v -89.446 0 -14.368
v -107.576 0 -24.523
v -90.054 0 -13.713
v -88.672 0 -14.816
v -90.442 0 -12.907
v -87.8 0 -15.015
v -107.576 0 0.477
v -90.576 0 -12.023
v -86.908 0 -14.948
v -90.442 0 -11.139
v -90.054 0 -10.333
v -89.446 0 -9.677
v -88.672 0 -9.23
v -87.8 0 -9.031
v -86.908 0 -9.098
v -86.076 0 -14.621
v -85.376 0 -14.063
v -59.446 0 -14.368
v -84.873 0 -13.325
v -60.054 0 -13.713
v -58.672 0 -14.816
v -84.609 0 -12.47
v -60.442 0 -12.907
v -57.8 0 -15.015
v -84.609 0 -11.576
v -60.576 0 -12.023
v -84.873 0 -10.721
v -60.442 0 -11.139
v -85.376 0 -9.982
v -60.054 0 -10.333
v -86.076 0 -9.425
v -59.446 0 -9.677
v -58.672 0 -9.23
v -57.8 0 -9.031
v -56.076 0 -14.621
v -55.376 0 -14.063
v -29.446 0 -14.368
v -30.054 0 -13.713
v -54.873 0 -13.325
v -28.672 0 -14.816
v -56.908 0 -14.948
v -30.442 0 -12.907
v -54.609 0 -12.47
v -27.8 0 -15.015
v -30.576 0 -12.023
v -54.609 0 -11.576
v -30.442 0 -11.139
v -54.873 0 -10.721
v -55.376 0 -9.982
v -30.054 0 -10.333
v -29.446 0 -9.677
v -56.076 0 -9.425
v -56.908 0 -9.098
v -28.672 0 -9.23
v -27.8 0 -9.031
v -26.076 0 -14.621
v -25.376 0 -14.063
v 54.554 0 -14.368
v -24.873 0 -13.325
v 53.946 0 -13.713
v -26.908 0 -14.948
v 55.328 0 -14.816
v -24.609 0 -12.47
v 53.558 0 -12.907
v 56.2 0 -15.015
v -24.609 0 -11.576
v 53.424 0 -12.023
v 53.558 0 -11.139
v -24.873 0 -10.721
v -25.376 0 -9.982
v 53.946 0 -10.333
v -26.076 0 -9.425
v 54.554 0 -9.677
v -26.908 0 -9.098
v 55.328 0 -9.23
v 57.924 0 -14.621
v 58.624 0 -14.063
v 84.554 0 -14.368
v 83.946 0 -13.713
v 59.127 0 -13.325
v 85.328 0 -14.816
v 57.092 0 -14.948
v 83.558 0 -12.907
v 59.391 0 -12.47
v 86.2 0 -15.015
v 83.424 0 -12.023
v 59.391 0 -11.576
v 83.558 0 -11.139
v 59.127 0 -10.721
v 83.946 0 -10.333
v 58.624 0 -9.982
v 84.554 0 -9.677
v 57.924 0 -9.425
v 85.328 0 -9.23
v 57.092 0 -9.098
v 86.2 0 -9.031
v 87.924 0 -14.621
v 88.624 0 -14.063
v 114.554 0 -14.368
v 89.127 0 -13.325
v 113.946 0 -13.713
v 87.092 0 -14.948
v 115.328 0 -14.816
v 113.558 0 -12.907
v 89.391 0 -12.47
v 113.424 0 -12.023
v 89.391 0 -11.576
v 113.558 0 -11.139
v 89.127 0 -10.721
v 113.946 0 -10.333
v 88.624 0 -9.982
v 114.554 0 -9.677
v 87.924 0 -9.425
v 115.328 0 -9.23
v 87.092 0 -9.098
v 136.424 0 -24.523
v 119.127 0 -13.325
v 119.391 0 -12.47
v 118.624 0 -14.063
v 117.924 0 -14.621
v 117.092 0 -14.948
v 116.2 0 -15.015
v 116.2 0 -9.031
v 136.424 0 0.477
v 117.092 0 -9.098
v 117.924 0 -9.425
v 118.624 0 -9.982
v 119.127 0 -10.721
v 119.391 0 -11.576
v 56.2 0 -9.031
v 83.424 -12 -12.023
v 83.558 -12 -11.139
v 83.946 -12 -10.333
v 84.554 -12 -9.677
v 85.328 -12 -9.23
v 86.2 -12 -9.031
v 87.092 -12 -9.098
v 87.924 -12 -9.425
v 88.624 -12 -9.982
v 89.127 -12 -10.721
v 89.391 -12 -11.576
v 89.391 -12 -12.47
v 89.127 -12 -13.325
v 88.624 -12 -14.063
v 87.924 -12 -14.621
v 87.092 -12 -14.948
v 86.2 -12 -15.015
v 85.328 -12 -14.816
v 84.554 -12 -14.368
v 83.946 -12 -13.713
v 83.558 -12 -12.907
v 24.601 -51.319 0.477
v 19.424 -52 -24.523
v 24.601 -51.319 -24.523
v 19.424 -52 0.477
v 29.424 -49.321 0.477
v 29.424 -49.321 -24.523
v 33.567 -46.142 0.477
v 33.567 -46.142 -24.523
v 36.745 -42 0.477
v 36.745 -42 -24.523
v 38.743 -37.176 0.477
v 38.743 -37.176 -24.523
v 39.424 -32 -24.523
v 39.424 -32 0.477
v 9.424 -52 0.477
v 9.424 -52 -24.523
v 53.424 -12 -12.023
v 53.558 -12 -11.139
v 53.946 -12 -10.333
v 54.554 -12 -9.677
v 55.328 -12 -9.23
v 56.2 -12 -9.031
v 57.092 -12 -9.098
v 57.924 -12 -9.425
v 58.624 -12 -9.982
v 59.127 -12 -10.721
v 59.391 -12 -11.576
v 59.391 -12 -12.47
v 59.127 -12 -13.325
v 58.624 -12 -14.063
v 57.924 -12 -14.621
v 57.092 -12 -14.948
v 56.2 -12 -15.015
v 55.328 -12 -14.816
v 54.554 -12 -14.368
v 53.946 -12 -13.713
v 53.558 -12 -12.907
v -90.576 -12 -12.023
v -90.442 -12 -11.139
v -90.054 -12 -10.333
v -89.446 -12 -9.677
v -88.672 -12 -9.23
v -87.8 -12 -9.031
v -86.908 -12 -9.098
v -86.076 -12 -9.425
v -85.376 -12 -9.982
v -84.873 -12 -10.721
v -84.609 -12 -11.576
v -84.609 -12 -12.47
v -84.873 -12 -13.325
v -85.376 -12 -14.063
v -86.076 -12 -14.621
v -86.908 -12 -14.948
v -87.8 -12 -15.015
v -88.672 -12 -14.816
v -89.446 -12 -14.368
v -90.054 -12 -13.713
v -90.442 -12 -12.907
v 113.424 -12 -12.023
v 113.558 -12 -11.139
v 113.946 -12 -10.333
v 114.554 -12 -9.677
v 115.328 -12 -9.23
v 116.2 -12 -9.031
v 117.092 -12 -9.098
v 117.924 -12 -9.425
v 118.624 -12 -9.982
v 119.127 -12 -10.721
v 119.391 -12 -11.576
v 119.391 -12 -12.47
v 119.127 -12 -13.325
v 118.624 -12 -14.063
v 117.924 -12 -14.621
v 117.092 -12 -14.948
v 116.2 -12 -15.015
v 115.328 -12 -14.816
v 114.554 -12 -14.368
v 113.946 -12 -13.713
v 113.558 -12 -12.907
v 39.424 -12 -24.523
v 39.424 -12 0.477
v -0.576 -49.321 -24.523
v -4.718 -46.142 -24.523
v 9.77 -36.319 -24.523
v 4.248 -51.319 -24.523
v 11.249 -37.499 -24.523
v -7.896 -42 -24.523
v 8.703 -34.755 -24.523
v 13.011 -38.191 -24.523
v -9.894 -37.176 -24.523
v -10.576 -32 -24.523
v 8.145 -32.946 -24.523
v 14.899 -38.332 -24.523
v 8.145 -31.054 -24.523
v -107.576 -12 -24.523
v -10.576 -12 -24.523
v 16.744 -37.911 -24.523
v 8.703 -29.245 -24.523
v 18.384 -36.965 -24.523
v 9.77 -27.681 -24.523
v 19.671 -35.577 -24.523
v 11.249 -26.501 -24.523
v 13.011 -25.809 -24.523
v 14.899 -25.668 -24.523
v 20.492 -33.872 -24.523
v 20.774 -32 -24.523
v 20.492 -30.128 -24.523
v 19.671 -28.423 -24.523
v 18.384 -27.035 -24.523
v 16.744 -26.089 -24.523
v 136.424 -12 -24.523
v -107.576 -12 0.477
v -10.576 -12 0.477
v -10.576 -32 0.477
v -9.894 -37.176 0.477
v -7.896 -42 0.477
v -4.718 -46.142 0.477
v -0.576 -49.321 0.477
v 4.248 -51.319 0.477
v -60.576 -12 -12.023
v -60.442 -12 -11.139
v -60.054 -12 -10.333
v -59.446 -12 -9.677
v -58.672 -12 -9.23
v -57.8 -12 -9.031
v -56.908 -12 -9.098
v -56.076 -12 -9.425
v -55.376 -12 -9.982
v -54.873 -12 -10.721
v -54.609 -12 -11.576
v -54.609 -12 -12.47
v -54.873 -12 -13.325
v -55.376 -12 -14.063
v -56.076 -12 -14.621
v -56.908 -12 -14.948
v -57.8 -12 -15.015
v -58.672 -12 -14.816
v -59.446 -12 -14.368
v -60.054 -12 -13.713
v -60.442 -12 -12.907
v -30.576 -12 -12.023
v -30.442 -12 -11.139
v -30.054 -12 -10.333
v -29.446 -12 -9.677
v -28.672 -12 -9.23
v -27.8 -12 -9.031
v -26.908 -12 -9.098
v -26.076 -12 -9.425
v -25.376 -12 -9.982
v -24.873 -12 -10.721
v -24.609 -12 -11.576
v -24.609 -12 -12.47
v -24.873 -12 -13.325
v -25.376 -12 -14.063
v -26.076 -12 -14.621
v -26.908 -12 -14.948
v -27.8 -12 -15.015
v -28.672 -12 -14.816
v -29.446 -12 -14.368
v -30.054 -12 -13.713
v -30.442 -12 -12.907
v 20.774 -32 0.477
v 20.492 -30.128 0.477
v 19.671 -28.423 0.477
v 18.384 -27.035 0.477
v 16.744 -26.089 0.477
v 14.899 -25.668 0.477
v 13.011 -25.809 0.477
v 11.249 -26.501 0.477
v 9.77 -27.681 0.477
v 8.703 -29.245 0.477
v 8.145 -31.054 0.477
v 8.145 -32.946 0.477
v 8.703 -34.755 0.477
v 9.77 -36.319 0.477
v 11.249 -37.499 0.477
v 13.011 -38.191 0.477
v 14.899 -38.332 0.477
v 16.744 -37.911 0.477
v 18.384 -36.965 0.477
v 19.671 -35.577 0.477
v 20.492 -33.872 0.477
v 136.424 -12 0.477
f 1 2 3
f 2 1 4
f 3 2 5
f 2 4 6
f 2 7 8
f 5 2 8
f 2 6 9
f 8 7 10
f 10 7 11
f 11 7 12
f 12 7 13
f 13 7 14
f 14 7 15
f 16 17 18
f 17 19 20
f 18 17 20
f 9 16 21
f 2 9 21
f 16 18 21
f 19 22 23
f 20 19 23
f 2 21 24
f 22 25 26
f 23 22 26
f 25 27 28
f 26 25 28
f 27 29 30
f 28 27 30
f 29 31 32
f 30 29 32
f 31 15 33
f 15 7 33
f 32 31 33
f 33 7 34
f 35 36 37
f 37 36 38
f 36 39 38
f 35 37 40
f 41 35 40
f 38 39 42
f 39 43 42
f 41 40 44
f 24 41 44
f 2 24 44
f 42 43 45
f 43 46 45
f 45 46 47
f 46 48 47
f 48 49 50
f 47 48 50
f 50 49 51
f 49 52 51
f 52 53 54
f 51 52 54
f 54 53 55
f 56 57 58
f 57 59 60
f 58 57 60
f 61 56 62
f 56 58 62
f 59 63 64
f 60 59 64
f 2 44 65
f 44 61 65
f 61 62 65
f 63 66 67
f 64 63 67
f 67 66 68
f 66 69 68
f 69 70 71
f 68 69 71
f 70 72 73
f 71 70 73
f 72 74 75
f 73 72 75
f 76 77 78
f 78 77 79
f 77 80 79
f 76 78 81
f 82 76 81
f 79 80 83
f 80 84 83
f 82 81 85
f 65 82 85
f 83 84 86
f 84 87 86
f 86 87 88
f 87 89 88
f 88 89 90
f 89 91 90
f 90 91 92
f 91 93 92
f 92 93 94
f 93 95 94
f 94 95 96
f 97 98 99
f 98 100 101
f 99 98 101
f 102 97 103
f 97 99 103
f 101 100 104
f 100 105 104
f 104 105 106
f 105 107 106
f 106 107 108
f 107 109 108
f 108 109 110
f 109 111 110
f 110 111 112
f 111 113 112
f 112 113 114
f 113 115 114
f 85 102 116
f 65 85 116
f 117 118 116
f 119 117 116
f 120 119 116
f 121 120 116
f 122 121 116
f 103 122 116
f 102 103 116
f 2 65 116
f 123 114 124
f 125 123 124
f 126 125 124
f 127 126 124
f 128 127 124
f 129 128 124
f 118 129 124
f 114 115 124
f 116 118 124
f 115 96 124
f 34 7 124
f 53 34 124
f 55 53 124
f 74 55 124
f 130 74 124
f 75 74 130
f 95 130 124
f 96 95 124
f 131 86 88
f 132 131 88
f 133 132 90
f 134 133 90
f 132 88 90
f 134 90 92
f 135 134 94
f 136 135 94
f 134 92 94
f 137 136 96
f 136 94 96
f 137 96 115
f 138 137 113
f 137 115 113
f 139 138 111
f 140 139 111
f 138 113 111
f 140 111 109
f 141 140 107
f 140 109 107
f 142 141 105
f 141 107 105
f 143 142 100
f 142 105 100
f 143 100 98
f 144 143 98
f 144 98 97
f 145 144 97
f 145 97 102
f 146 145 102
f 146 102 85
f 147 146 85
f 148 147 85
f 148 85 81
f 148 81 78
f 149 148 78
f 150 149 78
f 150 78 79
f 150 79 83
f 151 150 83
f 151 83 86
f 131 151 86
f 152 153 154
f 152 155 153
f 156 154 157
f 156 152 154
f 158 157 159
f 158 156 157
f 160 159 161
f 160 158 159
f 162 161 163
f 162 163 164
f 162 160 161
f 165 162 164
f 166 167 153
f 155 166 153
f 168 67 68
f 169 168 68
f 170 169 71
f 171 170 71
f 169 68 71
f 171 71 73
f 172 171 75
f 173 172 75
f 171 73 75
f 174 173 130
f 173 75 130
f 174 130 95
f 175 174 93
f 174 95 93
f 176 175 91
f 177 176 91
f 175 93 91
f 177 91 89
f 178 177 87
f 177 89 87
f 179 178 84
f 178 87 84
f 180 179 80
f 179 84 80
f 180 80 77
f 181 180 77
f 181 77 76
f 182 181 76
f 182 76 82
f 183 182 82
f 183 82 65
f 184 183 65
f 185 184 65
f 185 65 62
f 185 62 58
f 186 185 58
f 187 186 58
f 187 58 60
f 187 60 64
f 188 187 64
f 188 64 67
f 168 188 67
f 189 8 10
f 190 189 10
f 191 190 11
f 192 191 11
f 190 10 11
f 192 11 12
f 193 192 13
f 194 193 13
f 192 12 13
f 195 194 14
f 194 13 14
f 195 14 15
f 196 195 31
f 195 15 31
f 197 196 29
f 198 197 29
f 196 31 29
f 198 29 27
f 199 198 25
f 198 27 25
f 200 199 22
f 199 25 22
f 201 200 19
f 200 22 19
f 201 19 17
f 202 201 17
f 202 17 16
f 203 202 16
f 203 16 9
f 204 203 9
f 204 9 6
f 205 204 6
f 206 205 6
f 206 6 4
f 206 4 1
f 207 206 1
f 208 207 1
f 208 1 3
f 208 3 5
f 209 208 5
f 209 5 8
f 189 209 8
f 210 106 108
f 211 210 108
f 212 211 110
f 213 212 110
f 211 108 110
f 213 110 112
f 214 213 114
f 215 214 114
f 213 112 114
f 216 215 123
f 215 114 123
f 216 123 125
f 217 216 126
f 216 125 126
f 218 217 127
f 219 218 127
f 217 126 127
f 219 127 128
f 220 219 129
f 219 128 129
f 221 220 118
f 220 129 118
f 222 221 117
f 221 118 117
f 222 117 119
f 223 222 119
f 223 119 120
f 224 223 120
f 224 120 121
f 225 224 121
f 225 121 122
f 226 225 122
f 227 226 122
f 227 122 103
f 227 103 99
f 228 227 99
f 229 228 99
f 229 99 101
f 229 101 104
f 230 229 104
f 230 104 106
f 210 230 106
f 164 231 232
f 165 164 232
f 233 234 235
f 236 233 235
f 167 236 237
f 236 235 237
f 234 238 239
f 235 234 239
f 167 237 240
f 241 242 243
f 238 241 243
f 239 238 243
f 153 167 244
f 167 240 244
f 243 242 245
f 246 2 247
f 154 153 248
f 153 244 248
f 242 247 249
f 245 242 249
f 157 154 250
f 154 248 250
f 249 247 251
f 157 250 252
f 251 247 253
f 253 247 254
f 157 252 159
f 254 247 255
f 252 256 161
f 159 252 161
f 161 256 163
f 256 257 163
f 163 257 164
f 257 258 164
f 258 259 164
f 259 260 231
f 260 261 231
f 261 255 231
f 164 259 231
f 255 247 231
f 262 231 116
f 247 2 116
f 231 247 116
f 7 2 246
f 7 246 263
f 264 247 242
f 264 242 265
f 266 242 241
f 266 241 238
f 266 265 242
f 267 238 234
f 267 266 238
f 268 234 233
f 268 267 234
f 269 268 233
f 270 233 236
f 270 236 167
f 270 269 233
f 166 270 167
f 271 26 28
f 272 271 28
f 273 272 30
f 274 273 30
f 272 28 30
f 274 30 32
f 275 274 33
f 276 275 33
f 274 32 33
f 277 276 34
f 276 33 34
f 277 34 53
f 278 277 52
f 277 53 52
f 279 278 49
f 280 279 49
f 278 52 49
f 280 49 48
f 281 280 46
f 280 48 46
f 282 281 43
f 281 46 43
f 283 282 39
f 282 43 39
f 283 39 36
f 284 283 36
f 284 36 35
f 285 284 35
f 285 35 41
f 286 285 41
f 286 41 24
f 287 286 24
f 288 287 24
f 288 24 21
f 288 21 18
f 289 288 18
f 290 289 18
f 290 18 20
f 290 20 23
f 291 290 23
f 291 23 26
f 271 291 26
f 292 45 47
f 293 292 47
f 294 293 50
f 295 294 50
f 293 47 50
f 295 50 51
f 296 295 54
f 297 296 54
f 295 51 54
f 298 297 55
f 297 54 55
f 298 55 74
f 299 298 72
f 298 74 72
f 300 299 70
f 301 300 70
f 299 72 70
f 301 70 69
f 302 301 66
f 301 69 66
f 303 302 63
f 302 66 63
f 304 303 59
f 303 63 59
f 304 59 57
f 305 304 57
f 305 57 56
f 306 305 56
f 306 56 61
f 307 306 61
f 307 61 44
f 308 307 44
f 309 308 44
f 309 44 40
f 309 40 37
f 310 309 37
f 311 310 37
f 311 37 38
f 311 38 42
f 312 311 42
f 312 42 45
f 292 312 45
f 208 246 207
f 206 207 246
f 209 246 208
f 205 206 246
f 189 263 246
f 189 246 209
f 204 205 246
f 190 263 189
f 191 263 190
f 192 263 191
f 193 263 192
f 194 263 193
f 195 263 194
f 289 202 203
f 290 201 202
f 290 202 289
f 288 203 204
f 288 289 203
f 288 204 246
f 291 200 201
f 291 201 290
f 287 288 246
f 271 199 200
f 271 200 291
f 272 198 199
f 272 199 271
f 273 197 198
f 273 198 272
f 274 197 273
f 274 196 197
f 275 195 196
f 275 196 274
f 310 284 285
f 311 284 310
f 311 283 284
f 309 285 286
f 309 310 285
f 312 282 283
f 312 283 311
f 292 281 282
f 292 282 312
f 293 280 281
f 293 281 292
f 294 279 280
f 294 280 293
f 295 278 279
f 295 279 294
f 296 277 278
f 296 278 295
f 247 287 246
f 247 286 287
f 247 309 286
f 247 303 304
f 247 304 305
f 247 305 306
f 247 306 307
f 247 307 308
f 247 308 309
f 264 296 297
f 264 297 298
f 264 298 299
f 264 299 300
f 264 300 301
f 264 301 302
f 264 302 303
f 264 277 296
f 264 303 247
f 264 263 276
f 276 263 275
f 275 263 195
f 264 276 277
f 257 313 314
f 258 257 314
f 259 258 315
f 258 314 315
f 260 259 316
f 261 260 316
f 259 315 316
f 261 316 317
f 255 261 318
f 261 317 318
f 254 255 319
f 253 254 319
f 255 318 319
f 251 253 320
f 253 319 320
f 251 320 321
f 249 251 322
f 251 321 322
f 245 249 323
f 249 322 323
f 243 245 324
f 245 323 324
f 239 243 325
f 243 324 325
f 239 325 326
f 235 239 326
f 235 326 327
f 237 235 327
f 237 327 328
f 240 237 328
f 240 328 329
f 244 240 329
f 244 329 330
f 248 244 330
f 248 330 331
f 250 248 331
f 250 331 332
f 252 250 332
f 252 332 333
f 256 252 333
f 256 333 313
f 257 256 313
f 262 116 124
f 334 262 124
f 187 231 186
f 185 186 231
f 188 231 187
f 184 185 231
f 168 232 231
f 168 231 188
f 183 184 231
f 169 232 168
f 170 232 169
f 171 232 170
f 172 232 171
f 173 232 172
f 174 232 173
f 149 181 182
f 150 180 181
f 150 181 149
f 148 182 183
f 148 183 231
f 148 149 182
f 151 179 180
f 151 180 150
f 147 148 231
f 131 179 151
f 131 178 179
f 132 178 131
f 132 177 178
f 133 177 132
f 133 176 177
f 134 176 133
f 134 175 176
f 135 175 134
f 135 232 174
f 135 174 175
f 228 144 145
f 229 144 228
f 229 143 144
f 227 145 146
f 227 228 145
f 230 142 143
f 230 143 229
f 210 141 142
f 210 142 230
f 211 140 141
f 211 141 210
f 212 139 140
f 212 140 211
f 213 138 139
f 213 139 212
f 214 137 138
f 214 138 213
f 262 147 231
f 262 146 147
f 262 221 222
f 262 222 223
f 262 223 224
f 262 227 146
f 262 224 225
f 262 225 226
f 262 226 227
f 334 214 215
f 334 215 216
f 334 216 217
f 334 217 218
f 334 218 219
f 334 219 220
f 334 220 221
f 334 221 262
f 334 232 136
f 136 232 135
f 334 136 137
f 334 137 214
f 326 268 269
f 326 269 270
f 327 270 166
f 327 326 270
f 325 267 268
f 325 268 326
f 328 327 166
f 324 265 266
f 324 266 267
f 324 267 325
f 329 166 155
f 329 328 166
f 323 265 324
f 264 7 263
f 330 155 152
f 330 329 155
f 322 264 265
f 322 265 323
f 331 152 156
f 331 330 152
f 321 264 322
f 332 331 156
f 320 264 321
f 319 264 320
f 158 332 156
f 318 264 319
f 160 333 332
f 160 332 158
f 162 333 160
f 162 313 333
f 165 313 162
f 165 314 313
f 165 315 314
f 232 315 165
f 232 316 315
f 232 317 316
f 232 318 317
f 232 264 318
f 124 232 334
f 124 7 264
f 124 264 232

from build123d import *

# Parameters (mm, degrees)
F0_W     = 244
F0_H     = 25
F1_DEPTH = 12
F2_W     = 50
F2_H     = 25
F3_DEPTH = 40
F4_R     = 6.35
F5_DEPTH = 25.001
F6_R     = 20
F7_R     = 20
F8_R     = 3
F9_DEPTH = 52.001


with BuildPart() as f1:
    # F0 (on Front) → F1 (new body)
    with BuildSketch(Plane.XZ):
        with Locations((14.424432, -12.022949)):
            Rectangle(F0_W, F0_H)
    extrude(amount=F1_DEPTH)

    # F2 (on face) → F3 (join)
    with BuildSketch(Plane.XZ.offset(12)):
        with Locations((14.424432, -12.022949)):
            Rectangle(F2_W, F2_H)
    extrude(amount=F3_DEPTH)

    # F4 (on face) → F5 (cut, through all)
    with BuildSketch(Plane.XY.offset(0.477051)):
        with Locations((14.424432, -32)):
            Circle(F4_R)
    extrude(amount=-F5_DEPTH, mode=Mode.SUBTRACT)

    # F6
    f6_edges = [f1.edges().sort_by_distance(p)[0] for p in [
        (-10.575568, -52, -12.022949),
    ]]
    fillet(f6_edges, radius=F6_R)

    # F7
    f7_edges = [f1.edges().sort_by_distance(p)[0] for p in [
        (39.424432, -52, -12.022949),
    ]]
    fillet(f7_edges, radius=F7_R)

    # F8 (on face) → F9 (cut, through all)
    with BuildSketch(Plane(origin=(0, 0, 0), x_dir=(-1, 0, 0), z_dir=(0, 1, 0))):
        with Locations((87.575568, -12.022949)):
            Circle(F8_R)
        with Locations((57.575568, -12.022949)):
            Circle(F8_R)
        with Locations((-86.424432, -12.022949)):
            Circle(F8_R)
        with Locations((-116.424432, -12.022949)):
            Circle(F8_R)
        with Locations((-56.424432, -12.022949)):
            Circle(F8_R)
        with Locations((27.575568, -12.022949)):
            Circle(F8_R)
    extrude(amount=-F9_DEPTH, mode=Mode.SUBTRACT)


solid = f1.part
